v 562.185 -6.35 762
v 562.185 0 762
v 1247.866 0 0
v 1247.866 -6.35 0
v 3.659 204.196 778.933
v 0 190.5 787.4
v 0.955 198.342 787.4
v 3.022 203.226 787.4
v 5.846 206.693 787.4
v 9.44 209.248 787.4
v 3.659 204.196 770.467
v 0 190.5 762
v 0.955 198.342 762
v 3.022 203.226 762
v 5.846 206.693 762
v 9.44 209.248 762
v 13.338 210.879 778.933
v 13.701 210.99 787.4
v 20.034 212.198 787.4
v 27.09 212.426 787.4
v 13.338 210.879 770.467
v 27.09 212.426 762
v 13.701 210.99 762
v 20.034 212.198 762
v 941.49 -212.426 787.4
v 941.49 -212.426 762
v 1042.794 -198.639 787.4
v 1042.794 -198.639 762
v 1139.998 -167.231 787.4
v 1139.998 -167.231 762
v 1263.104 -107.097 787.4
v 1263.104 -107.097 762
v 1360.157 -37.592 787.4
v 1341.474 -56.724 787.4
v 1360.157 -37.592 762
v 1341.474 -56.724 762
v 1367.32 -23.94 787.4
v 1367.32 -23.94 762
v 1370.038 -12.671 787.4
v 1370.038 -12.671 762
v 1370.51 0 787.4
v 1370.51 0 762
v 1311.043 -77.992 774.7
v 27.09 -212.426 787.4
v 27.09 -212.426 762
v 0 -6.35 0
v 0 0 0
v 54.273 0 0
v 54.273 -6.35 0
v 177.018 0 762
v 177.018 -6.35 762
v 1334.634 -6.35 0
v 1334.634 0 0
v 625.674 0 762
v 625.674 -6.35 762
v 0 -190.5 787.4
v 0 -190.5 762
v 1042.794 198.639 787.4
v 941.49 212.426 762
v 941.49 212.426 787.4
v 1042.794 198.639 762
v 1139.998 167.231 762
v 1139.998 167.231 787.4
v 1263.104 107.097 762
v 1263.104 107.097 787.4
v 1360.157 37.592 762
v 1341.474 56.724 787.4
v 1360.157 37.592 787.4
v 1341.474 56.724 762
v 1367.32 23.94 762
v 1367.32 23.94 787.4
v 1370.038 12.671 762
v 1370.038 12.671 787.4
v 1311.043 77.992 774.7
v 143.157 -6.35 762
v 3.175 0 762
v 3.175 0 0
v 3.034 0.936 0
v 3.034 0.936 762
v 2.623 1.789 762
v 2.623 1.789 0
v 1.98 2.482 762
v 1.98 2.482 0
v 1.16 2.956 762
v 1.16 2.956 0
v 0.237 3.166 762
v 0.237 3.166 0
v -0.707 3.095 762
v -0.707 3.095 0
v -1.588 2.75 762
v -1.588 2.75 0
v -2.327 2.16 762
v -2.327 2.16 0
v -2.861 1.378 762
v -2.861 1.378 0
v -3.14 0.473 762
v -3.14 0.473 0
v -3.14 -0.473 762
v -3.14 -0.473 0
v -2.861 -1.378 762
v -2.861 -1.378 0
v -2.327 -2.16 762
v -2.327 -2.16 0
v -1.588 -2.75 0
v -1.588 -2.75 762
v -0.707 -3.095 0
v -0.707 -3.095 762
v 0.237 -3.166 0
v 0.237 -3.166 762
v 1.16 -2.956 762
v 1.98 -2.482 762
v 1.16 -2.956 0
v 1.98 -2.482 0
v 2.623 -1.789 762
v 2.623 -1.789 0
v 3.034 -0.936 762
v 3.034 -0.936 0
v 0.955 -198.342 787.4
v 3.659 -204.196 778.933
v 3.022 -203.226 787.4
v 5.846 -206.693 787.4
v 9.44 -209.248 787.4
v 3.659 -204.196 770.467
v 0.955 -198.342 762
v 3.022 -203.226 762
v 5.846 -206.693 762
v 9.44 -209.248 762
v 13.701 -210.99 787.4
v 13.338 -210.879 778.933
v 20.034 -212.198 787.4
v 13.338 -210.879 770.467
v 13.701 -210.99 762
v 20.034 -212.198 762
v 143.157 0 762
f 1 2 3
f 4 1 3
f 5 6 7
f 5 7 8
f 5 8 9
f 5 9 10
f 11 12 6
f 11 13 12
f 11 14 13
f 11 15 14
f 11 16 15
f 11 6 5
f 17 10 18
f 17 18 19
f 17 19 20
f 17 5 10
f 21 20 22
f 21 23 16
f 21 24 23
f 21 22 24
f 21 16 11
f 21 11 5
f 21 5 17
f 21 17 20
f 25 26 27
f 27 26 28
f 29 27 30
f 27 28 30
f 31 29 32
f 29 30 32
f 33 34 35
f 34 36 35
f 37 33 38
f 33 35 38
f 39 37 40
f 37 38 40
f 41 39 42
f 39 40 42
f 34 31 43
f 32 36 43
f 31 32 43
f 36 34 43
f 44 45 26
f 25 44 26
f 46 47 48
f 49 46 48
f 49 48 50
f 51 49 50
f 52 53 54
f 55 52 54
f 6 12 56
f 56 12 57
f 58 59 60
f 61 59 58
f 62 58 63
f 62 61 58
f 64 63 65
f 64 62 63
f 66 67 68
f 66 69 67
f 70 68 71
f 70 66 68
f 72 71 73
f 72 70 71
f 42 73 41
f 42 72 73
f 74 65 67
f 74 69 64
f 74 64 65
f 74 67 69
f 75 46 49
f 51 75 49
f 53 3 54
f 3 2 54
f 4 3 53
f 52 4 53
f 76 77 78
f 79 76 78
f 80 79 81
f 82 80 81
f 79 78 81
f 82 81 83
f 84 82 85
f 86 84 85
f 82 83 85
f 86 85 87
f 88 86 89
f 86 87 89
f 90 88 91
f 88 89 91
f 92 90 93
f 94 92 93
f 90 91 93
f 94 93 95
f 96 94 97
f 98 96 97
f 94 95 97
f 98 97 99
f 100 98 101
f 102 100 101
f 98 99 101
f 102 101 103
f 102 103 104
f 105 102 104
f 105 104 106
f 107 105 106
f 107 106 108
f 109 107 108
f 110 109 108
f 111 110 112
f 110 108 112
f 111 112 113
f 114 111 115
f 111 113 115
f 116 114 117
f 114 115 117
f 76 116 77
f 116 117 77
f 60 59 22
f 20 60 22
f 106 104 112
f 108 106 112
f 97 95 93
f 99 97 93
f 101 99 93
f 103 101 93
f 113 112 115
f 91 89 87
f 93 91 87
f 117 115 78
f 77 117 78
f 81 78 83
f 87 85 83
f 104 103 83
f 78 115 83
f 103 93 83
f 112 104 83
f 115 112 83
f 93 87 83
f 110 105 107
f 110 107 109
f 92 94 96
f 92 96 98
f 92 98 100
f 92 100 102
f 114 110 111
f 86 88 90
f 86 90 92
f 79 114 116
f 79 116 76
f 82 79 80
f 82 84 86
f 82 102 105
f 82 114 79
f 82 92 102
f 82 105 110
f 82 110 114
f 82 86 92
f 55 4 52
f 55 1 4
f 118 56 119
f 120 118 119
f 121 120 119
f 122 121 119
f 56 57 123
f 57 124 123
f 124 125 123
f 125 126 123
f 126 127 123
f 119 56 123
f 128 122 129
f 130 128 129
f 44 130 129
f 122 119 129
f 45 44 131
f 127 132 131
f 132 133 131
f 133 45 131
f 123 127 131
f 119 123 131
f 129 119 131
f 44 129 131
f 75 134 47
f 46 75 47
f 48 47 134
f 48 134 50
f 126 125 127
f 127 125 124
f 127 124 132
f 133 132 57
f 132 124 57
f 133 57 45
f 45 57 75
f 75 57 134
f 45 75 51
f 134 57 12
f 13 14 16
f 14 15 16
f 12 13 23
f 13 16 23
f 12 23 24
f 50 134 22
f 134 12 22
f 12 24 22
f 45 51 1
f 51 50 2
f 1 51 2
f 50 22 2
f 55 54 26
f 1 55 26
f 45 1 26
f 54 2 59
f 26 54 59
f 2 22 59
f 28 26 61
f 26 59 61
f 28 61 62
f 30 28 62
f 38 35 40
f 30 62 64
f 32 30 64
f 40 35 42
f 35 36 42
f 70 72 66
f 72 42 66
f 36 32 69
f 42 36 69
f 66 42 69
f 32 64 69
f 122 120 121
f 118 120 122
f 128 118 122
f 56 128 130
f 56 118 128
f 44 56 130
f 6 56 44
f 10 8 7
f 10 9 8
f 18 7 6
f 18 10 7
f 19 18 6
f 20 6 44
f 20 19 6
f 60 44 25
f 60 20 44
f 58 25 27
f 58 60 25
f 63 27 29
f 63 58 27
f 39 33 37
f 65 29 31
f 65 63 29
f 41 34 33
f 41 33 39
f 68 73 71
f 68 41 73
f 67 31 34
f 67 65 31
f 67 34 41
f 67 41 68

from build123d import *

# Parameters (mm, degrees)
F1_R     = 3.175
F2_DEPTH = 762
F3_DEPTH = 6.35
F5_DEPTH = 25.4


with BuildPart() as f2:
    # F1 (on Top) → F2 (new body)
    with BuildSketch(Plane.XY):
        Circle(F1_R)
    extrude(amount=F2_DEPTH)


with BuildPart() as f3:
    # F0 (on Front) → F3 (new body)
    with BuildSketch(Plane.XZ):
        Polygon((1247.8656768799, 0), (1334.6340656281, 0), (625.6737112999, 762), (562.1847510338, 762), align=None)
    extrude(amount=F3_DEPTH)



with BuildPart() as f3b:
    # F0 (on Front) → F3, piece 2 (new body)
    with BuildSketch(Plane.XZ):
        Polygon((143.1574821472, 762), (0, 0), (54.2729124427, 0), (177.0182698965, 762), align=None)
    extrude(amount=F3_DEPTH)


with BuildPart() as f3_1:
    add(f3.part)

    add(f3b.part)  # F5 merges F3b
    # F4 (on face) → F5 (join)
    with BuildSketch(Plane.XY.offset(762)):
        with BuildLine():
            Line((0, 190.5), (0, 0))
            Line((0, 0), (0, -190.5))
            add(Edge.make_bspline(
                [(0, -190.5), (0, -208.3280831575), (11.9508374482, -212.820827961), (27.0897336304, -212.4256193638)],
                knots=[0, 0, 0, 0, 34.8509175296, 34.8509175296, 34.8509175296, 34.8509175296], degree=3))
            Line((27.0897336304, -212.4256193638), (941.4897336304, -212.4256193638))
            add(Edge.make_bspline(
                [(941.4897336304, -212.4256193638), (1084.1052532196, -209.4828337431), (1306.4068704852, -88.0603993583), (1372.2732067108, -35.1411737502), (1370.5102205276, 0)],
                knots=[0, 0, 0, 0, 0.6669321304, 1, 1, 1, 1], degree=3))
            add(Edge.make_bspline(
                [(941.4897336304, 212.4256193638), (1084.1052532196, 209.4828337431), (1306.4068704852, 88.0603993583), (1372.2732067108, 35.1411737502), (1370.5102205276, 0)],
                knots=[0, 0, 0, 0, 0.6669321304, 1, 1, 1, 1], degree=3))
            Line((941.4897336304, 212.4256193638), (27.0897336304, 212.4256193638))
            add(Edge.make_bspline(
                [(0, 190.5), (0, 208.3280831575), (11.9508374482, 212.820827961), (27.0897336304, 212.4256193638)],
                knots=[0, 0, 0, 0, 34.8509175296, 34.8509175296, 34.8509175296, 34.8509175296], degree=3))
        make_face()
    extrude(amount=F5_DEPTH)


solid = Compound([f2.part, f3_1.part])
